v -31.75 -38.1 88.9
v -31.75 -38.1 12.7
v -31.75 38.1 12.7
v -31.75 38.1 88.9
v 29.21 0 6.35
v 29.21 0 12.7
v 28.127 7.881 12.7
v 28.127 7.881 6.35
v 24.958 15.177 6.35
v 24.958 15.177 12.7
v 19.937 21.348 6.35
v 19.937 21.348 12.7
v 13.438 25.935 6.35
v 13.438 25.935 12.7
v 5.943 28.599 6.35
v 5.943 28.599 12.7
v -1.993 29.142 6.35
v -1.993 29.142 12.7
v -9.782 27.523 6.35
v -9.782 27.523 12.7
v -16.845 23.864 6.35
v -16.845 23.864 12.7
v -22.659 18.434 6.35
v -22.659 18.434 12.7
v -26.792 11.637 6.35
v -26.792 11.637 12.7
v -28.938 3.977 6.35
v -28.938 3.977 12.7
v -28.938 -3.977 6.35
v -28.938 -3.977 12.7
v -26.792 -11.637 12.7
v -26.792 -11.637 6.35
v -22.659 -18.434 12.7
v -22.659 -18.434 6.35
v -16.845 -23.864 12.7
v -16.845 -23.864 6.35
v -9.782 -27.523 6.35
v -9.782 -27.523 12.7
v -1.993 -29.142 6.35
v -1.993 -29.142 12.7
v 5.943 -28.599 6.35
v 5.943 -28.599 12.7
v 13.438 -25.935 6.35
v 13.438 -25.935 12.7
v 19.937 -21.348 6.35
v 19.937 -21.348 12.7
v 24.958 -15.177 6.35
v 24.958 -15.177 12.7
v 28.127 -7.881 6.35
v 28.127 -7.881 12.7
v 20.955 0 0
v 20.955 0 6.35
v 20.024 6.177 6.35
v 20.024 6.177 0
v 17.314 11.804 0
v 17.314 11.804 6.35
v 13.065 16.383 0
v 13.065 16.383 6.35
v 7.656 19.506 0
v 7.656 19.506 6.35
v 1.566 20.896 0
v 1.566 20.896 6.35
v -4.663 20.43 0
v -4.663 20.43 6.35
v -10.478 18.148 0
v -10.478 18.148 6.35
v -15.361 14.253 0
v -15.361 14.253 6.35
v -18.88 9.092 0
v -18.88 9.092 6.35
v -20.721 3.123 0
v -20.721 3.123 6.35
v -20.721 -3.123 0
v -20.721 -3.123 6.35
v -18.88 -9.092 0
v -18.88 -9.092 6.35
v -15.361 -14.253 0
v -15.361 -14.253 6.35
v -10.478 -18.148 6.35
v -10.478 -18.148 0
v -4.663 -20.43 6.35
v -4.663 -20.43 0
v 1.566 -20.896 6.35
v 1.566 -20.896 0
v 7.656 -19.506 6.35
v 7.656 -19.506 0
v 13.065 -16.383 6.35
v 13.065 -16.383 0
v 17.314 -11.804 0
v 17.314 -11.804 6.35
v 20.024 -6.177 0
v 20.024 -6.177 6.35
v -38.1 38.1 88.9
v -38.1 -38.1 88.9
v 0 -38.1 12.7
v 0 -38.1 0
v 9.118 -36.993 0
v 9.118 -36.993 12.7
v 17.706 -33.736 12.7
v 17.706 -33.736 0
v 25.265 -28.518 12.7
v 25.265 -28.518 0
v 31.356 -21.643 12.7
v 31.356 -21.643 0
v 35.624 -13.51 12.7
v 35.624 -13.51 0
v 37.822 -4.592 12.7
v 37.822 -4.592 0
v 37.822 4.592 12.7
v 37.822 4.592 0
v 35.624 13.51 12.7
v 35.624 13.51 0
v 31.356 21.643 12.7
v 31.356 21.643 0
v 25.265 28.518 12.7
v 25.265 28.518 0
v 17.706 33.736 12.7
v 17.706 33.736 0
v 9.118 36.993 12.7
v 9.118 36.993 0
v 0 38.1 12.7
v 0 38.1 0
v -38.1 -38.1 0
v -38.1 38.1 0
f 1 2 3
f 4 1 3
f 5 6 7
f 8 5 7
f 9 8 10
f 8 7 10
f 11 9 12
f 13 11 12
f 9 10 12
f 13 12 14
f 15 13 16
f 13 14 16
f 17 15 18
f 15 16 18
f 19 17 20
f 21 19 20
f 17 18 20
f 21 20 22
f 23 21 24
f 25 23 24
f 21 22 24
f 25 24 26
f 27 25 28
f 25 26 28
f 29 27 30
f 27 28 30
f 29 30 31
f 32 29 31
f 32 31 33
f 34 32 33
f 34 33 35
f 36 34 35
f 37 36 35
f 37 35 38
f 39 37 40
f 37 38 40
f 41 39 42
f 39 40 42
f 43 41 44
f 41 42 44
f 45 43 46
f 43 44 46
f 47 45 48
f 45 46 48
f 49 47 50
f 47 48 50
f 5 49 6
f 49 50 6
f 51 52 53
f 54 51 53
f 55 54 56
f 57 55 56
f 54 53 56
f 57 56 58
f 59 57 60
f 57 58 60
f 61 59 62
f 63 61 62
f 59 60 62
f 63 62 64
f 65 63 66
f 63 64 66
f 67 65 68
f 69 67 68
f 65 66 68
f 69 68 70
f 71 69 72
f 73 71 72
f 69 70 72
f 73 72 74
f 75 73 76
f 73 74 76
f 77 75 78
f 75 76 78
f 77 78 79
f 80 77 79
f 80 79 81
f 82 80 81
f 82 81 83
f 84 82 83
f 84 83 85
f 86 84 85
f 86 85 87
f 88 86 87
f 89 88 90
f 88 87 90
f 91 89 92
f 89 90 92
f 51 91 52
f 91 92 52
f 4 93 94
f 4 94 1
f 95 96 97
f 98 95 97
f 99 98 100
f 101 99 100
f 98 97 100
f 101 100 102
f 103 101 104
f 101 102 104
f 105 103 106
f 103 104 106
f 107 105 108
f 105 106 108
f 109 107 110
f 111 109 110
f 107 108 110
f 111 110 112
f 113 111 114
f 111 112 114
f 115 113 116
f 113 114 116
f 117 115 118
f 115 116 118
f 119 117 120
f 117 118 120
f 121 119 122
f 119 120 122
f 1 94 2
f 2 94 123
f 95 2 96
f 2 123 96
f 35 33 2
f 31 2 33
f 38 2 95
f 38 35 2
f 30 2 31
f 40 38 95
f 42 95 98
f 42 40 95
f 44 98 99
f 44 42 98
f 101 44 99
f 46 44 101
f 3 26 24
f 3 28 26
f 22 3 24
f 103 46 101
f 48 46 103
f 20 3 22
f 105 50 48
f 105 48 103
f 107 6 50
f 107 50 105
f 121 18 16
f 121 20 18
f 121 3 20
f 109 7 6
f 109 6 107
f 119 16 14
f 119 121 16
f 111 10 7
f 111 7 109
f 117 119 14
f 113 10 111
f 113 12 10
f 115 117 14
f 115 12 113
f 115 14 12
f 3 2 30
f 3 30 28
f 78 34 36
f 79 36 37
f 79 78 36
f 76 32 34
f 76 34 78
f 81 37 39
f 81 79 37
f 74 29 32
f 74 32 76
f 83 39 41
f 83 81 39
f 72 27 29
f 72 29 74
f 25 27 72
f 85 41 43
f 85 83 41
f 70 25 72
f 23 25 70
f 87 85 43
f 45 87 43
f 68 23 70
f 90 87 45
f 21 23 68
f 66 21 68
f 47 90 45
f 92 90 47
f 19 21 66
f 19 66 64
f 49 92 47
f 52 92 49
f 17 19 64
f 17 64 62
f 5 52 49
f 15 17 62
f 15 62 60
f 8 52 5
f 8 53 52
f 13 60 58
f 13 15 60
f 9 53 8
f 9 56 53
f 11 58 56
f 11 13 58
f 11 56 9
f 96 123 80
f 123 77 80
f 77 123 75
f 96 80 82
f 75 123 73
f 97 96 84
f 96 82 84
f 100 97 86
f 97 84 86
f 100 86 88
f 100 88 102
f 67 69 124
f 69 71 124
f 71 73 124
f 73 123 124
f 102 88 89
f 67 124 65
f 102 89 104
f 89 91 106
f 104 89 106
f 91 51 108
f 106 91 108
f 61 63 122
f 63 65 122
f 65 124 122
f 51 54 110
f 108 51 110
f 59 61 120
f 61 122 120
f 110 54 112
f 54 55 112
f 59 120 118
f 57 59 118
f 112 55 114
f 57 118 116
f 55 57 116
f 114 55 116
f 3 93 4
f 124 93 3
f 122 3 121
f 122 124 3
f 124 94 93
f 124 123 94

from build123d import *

# Parameters (mm, degrees)
F1_DEPTH = 12.7
F2_R     = 29.21
F3_DEPTH = 6.35
F4_R     = 20.955
F5_DEPTH = 6.35
F6_W     = 6.35
F6_H     = 76.2
F7_DEPTH = 76.2


with BuildPart() as f1:
    # F0 (on Top) → F1 (new body)
    with BuildSketch(Plane.XY):
        with BuildLine():
            ThreePointArc((0, -38.1), (38.1, 0), (0, 38.1))
            Line((0, 38.1), (-38.1, 38.1))
            Line((-38.1, 38.1), (-38.1, -38.1))
            Line((-38.1, -38.1), (0, -38.1))
        make_face()
    extrude(amount=F1_DEPTH)

    # F2 (on face) → F3 (cut)
    with BuildSketch(Plane.XY.offset(12.7)):
        Circle(F2_R)
    extrude(amount=-F3_DEPTH, mode=Mode.SUBTRACT)

    # F4 (on face) → F5 (cut)
    with BuildSketch(Plane.XY.offset(6.35)):
        Circle(F4_R)
    extrude(amount=-F5_DEPTH, mode=Mode.SUBTRACT)

    # F6 (on face) → F7 (join)
    with BuildSketch(Plane.XY.offset(12.7)):
        with Locations((-34.925, 0)):
            Rectangle(F6_W, F6_H)
    extrude(amount=F7_DEPTH)


solid = f1.part
